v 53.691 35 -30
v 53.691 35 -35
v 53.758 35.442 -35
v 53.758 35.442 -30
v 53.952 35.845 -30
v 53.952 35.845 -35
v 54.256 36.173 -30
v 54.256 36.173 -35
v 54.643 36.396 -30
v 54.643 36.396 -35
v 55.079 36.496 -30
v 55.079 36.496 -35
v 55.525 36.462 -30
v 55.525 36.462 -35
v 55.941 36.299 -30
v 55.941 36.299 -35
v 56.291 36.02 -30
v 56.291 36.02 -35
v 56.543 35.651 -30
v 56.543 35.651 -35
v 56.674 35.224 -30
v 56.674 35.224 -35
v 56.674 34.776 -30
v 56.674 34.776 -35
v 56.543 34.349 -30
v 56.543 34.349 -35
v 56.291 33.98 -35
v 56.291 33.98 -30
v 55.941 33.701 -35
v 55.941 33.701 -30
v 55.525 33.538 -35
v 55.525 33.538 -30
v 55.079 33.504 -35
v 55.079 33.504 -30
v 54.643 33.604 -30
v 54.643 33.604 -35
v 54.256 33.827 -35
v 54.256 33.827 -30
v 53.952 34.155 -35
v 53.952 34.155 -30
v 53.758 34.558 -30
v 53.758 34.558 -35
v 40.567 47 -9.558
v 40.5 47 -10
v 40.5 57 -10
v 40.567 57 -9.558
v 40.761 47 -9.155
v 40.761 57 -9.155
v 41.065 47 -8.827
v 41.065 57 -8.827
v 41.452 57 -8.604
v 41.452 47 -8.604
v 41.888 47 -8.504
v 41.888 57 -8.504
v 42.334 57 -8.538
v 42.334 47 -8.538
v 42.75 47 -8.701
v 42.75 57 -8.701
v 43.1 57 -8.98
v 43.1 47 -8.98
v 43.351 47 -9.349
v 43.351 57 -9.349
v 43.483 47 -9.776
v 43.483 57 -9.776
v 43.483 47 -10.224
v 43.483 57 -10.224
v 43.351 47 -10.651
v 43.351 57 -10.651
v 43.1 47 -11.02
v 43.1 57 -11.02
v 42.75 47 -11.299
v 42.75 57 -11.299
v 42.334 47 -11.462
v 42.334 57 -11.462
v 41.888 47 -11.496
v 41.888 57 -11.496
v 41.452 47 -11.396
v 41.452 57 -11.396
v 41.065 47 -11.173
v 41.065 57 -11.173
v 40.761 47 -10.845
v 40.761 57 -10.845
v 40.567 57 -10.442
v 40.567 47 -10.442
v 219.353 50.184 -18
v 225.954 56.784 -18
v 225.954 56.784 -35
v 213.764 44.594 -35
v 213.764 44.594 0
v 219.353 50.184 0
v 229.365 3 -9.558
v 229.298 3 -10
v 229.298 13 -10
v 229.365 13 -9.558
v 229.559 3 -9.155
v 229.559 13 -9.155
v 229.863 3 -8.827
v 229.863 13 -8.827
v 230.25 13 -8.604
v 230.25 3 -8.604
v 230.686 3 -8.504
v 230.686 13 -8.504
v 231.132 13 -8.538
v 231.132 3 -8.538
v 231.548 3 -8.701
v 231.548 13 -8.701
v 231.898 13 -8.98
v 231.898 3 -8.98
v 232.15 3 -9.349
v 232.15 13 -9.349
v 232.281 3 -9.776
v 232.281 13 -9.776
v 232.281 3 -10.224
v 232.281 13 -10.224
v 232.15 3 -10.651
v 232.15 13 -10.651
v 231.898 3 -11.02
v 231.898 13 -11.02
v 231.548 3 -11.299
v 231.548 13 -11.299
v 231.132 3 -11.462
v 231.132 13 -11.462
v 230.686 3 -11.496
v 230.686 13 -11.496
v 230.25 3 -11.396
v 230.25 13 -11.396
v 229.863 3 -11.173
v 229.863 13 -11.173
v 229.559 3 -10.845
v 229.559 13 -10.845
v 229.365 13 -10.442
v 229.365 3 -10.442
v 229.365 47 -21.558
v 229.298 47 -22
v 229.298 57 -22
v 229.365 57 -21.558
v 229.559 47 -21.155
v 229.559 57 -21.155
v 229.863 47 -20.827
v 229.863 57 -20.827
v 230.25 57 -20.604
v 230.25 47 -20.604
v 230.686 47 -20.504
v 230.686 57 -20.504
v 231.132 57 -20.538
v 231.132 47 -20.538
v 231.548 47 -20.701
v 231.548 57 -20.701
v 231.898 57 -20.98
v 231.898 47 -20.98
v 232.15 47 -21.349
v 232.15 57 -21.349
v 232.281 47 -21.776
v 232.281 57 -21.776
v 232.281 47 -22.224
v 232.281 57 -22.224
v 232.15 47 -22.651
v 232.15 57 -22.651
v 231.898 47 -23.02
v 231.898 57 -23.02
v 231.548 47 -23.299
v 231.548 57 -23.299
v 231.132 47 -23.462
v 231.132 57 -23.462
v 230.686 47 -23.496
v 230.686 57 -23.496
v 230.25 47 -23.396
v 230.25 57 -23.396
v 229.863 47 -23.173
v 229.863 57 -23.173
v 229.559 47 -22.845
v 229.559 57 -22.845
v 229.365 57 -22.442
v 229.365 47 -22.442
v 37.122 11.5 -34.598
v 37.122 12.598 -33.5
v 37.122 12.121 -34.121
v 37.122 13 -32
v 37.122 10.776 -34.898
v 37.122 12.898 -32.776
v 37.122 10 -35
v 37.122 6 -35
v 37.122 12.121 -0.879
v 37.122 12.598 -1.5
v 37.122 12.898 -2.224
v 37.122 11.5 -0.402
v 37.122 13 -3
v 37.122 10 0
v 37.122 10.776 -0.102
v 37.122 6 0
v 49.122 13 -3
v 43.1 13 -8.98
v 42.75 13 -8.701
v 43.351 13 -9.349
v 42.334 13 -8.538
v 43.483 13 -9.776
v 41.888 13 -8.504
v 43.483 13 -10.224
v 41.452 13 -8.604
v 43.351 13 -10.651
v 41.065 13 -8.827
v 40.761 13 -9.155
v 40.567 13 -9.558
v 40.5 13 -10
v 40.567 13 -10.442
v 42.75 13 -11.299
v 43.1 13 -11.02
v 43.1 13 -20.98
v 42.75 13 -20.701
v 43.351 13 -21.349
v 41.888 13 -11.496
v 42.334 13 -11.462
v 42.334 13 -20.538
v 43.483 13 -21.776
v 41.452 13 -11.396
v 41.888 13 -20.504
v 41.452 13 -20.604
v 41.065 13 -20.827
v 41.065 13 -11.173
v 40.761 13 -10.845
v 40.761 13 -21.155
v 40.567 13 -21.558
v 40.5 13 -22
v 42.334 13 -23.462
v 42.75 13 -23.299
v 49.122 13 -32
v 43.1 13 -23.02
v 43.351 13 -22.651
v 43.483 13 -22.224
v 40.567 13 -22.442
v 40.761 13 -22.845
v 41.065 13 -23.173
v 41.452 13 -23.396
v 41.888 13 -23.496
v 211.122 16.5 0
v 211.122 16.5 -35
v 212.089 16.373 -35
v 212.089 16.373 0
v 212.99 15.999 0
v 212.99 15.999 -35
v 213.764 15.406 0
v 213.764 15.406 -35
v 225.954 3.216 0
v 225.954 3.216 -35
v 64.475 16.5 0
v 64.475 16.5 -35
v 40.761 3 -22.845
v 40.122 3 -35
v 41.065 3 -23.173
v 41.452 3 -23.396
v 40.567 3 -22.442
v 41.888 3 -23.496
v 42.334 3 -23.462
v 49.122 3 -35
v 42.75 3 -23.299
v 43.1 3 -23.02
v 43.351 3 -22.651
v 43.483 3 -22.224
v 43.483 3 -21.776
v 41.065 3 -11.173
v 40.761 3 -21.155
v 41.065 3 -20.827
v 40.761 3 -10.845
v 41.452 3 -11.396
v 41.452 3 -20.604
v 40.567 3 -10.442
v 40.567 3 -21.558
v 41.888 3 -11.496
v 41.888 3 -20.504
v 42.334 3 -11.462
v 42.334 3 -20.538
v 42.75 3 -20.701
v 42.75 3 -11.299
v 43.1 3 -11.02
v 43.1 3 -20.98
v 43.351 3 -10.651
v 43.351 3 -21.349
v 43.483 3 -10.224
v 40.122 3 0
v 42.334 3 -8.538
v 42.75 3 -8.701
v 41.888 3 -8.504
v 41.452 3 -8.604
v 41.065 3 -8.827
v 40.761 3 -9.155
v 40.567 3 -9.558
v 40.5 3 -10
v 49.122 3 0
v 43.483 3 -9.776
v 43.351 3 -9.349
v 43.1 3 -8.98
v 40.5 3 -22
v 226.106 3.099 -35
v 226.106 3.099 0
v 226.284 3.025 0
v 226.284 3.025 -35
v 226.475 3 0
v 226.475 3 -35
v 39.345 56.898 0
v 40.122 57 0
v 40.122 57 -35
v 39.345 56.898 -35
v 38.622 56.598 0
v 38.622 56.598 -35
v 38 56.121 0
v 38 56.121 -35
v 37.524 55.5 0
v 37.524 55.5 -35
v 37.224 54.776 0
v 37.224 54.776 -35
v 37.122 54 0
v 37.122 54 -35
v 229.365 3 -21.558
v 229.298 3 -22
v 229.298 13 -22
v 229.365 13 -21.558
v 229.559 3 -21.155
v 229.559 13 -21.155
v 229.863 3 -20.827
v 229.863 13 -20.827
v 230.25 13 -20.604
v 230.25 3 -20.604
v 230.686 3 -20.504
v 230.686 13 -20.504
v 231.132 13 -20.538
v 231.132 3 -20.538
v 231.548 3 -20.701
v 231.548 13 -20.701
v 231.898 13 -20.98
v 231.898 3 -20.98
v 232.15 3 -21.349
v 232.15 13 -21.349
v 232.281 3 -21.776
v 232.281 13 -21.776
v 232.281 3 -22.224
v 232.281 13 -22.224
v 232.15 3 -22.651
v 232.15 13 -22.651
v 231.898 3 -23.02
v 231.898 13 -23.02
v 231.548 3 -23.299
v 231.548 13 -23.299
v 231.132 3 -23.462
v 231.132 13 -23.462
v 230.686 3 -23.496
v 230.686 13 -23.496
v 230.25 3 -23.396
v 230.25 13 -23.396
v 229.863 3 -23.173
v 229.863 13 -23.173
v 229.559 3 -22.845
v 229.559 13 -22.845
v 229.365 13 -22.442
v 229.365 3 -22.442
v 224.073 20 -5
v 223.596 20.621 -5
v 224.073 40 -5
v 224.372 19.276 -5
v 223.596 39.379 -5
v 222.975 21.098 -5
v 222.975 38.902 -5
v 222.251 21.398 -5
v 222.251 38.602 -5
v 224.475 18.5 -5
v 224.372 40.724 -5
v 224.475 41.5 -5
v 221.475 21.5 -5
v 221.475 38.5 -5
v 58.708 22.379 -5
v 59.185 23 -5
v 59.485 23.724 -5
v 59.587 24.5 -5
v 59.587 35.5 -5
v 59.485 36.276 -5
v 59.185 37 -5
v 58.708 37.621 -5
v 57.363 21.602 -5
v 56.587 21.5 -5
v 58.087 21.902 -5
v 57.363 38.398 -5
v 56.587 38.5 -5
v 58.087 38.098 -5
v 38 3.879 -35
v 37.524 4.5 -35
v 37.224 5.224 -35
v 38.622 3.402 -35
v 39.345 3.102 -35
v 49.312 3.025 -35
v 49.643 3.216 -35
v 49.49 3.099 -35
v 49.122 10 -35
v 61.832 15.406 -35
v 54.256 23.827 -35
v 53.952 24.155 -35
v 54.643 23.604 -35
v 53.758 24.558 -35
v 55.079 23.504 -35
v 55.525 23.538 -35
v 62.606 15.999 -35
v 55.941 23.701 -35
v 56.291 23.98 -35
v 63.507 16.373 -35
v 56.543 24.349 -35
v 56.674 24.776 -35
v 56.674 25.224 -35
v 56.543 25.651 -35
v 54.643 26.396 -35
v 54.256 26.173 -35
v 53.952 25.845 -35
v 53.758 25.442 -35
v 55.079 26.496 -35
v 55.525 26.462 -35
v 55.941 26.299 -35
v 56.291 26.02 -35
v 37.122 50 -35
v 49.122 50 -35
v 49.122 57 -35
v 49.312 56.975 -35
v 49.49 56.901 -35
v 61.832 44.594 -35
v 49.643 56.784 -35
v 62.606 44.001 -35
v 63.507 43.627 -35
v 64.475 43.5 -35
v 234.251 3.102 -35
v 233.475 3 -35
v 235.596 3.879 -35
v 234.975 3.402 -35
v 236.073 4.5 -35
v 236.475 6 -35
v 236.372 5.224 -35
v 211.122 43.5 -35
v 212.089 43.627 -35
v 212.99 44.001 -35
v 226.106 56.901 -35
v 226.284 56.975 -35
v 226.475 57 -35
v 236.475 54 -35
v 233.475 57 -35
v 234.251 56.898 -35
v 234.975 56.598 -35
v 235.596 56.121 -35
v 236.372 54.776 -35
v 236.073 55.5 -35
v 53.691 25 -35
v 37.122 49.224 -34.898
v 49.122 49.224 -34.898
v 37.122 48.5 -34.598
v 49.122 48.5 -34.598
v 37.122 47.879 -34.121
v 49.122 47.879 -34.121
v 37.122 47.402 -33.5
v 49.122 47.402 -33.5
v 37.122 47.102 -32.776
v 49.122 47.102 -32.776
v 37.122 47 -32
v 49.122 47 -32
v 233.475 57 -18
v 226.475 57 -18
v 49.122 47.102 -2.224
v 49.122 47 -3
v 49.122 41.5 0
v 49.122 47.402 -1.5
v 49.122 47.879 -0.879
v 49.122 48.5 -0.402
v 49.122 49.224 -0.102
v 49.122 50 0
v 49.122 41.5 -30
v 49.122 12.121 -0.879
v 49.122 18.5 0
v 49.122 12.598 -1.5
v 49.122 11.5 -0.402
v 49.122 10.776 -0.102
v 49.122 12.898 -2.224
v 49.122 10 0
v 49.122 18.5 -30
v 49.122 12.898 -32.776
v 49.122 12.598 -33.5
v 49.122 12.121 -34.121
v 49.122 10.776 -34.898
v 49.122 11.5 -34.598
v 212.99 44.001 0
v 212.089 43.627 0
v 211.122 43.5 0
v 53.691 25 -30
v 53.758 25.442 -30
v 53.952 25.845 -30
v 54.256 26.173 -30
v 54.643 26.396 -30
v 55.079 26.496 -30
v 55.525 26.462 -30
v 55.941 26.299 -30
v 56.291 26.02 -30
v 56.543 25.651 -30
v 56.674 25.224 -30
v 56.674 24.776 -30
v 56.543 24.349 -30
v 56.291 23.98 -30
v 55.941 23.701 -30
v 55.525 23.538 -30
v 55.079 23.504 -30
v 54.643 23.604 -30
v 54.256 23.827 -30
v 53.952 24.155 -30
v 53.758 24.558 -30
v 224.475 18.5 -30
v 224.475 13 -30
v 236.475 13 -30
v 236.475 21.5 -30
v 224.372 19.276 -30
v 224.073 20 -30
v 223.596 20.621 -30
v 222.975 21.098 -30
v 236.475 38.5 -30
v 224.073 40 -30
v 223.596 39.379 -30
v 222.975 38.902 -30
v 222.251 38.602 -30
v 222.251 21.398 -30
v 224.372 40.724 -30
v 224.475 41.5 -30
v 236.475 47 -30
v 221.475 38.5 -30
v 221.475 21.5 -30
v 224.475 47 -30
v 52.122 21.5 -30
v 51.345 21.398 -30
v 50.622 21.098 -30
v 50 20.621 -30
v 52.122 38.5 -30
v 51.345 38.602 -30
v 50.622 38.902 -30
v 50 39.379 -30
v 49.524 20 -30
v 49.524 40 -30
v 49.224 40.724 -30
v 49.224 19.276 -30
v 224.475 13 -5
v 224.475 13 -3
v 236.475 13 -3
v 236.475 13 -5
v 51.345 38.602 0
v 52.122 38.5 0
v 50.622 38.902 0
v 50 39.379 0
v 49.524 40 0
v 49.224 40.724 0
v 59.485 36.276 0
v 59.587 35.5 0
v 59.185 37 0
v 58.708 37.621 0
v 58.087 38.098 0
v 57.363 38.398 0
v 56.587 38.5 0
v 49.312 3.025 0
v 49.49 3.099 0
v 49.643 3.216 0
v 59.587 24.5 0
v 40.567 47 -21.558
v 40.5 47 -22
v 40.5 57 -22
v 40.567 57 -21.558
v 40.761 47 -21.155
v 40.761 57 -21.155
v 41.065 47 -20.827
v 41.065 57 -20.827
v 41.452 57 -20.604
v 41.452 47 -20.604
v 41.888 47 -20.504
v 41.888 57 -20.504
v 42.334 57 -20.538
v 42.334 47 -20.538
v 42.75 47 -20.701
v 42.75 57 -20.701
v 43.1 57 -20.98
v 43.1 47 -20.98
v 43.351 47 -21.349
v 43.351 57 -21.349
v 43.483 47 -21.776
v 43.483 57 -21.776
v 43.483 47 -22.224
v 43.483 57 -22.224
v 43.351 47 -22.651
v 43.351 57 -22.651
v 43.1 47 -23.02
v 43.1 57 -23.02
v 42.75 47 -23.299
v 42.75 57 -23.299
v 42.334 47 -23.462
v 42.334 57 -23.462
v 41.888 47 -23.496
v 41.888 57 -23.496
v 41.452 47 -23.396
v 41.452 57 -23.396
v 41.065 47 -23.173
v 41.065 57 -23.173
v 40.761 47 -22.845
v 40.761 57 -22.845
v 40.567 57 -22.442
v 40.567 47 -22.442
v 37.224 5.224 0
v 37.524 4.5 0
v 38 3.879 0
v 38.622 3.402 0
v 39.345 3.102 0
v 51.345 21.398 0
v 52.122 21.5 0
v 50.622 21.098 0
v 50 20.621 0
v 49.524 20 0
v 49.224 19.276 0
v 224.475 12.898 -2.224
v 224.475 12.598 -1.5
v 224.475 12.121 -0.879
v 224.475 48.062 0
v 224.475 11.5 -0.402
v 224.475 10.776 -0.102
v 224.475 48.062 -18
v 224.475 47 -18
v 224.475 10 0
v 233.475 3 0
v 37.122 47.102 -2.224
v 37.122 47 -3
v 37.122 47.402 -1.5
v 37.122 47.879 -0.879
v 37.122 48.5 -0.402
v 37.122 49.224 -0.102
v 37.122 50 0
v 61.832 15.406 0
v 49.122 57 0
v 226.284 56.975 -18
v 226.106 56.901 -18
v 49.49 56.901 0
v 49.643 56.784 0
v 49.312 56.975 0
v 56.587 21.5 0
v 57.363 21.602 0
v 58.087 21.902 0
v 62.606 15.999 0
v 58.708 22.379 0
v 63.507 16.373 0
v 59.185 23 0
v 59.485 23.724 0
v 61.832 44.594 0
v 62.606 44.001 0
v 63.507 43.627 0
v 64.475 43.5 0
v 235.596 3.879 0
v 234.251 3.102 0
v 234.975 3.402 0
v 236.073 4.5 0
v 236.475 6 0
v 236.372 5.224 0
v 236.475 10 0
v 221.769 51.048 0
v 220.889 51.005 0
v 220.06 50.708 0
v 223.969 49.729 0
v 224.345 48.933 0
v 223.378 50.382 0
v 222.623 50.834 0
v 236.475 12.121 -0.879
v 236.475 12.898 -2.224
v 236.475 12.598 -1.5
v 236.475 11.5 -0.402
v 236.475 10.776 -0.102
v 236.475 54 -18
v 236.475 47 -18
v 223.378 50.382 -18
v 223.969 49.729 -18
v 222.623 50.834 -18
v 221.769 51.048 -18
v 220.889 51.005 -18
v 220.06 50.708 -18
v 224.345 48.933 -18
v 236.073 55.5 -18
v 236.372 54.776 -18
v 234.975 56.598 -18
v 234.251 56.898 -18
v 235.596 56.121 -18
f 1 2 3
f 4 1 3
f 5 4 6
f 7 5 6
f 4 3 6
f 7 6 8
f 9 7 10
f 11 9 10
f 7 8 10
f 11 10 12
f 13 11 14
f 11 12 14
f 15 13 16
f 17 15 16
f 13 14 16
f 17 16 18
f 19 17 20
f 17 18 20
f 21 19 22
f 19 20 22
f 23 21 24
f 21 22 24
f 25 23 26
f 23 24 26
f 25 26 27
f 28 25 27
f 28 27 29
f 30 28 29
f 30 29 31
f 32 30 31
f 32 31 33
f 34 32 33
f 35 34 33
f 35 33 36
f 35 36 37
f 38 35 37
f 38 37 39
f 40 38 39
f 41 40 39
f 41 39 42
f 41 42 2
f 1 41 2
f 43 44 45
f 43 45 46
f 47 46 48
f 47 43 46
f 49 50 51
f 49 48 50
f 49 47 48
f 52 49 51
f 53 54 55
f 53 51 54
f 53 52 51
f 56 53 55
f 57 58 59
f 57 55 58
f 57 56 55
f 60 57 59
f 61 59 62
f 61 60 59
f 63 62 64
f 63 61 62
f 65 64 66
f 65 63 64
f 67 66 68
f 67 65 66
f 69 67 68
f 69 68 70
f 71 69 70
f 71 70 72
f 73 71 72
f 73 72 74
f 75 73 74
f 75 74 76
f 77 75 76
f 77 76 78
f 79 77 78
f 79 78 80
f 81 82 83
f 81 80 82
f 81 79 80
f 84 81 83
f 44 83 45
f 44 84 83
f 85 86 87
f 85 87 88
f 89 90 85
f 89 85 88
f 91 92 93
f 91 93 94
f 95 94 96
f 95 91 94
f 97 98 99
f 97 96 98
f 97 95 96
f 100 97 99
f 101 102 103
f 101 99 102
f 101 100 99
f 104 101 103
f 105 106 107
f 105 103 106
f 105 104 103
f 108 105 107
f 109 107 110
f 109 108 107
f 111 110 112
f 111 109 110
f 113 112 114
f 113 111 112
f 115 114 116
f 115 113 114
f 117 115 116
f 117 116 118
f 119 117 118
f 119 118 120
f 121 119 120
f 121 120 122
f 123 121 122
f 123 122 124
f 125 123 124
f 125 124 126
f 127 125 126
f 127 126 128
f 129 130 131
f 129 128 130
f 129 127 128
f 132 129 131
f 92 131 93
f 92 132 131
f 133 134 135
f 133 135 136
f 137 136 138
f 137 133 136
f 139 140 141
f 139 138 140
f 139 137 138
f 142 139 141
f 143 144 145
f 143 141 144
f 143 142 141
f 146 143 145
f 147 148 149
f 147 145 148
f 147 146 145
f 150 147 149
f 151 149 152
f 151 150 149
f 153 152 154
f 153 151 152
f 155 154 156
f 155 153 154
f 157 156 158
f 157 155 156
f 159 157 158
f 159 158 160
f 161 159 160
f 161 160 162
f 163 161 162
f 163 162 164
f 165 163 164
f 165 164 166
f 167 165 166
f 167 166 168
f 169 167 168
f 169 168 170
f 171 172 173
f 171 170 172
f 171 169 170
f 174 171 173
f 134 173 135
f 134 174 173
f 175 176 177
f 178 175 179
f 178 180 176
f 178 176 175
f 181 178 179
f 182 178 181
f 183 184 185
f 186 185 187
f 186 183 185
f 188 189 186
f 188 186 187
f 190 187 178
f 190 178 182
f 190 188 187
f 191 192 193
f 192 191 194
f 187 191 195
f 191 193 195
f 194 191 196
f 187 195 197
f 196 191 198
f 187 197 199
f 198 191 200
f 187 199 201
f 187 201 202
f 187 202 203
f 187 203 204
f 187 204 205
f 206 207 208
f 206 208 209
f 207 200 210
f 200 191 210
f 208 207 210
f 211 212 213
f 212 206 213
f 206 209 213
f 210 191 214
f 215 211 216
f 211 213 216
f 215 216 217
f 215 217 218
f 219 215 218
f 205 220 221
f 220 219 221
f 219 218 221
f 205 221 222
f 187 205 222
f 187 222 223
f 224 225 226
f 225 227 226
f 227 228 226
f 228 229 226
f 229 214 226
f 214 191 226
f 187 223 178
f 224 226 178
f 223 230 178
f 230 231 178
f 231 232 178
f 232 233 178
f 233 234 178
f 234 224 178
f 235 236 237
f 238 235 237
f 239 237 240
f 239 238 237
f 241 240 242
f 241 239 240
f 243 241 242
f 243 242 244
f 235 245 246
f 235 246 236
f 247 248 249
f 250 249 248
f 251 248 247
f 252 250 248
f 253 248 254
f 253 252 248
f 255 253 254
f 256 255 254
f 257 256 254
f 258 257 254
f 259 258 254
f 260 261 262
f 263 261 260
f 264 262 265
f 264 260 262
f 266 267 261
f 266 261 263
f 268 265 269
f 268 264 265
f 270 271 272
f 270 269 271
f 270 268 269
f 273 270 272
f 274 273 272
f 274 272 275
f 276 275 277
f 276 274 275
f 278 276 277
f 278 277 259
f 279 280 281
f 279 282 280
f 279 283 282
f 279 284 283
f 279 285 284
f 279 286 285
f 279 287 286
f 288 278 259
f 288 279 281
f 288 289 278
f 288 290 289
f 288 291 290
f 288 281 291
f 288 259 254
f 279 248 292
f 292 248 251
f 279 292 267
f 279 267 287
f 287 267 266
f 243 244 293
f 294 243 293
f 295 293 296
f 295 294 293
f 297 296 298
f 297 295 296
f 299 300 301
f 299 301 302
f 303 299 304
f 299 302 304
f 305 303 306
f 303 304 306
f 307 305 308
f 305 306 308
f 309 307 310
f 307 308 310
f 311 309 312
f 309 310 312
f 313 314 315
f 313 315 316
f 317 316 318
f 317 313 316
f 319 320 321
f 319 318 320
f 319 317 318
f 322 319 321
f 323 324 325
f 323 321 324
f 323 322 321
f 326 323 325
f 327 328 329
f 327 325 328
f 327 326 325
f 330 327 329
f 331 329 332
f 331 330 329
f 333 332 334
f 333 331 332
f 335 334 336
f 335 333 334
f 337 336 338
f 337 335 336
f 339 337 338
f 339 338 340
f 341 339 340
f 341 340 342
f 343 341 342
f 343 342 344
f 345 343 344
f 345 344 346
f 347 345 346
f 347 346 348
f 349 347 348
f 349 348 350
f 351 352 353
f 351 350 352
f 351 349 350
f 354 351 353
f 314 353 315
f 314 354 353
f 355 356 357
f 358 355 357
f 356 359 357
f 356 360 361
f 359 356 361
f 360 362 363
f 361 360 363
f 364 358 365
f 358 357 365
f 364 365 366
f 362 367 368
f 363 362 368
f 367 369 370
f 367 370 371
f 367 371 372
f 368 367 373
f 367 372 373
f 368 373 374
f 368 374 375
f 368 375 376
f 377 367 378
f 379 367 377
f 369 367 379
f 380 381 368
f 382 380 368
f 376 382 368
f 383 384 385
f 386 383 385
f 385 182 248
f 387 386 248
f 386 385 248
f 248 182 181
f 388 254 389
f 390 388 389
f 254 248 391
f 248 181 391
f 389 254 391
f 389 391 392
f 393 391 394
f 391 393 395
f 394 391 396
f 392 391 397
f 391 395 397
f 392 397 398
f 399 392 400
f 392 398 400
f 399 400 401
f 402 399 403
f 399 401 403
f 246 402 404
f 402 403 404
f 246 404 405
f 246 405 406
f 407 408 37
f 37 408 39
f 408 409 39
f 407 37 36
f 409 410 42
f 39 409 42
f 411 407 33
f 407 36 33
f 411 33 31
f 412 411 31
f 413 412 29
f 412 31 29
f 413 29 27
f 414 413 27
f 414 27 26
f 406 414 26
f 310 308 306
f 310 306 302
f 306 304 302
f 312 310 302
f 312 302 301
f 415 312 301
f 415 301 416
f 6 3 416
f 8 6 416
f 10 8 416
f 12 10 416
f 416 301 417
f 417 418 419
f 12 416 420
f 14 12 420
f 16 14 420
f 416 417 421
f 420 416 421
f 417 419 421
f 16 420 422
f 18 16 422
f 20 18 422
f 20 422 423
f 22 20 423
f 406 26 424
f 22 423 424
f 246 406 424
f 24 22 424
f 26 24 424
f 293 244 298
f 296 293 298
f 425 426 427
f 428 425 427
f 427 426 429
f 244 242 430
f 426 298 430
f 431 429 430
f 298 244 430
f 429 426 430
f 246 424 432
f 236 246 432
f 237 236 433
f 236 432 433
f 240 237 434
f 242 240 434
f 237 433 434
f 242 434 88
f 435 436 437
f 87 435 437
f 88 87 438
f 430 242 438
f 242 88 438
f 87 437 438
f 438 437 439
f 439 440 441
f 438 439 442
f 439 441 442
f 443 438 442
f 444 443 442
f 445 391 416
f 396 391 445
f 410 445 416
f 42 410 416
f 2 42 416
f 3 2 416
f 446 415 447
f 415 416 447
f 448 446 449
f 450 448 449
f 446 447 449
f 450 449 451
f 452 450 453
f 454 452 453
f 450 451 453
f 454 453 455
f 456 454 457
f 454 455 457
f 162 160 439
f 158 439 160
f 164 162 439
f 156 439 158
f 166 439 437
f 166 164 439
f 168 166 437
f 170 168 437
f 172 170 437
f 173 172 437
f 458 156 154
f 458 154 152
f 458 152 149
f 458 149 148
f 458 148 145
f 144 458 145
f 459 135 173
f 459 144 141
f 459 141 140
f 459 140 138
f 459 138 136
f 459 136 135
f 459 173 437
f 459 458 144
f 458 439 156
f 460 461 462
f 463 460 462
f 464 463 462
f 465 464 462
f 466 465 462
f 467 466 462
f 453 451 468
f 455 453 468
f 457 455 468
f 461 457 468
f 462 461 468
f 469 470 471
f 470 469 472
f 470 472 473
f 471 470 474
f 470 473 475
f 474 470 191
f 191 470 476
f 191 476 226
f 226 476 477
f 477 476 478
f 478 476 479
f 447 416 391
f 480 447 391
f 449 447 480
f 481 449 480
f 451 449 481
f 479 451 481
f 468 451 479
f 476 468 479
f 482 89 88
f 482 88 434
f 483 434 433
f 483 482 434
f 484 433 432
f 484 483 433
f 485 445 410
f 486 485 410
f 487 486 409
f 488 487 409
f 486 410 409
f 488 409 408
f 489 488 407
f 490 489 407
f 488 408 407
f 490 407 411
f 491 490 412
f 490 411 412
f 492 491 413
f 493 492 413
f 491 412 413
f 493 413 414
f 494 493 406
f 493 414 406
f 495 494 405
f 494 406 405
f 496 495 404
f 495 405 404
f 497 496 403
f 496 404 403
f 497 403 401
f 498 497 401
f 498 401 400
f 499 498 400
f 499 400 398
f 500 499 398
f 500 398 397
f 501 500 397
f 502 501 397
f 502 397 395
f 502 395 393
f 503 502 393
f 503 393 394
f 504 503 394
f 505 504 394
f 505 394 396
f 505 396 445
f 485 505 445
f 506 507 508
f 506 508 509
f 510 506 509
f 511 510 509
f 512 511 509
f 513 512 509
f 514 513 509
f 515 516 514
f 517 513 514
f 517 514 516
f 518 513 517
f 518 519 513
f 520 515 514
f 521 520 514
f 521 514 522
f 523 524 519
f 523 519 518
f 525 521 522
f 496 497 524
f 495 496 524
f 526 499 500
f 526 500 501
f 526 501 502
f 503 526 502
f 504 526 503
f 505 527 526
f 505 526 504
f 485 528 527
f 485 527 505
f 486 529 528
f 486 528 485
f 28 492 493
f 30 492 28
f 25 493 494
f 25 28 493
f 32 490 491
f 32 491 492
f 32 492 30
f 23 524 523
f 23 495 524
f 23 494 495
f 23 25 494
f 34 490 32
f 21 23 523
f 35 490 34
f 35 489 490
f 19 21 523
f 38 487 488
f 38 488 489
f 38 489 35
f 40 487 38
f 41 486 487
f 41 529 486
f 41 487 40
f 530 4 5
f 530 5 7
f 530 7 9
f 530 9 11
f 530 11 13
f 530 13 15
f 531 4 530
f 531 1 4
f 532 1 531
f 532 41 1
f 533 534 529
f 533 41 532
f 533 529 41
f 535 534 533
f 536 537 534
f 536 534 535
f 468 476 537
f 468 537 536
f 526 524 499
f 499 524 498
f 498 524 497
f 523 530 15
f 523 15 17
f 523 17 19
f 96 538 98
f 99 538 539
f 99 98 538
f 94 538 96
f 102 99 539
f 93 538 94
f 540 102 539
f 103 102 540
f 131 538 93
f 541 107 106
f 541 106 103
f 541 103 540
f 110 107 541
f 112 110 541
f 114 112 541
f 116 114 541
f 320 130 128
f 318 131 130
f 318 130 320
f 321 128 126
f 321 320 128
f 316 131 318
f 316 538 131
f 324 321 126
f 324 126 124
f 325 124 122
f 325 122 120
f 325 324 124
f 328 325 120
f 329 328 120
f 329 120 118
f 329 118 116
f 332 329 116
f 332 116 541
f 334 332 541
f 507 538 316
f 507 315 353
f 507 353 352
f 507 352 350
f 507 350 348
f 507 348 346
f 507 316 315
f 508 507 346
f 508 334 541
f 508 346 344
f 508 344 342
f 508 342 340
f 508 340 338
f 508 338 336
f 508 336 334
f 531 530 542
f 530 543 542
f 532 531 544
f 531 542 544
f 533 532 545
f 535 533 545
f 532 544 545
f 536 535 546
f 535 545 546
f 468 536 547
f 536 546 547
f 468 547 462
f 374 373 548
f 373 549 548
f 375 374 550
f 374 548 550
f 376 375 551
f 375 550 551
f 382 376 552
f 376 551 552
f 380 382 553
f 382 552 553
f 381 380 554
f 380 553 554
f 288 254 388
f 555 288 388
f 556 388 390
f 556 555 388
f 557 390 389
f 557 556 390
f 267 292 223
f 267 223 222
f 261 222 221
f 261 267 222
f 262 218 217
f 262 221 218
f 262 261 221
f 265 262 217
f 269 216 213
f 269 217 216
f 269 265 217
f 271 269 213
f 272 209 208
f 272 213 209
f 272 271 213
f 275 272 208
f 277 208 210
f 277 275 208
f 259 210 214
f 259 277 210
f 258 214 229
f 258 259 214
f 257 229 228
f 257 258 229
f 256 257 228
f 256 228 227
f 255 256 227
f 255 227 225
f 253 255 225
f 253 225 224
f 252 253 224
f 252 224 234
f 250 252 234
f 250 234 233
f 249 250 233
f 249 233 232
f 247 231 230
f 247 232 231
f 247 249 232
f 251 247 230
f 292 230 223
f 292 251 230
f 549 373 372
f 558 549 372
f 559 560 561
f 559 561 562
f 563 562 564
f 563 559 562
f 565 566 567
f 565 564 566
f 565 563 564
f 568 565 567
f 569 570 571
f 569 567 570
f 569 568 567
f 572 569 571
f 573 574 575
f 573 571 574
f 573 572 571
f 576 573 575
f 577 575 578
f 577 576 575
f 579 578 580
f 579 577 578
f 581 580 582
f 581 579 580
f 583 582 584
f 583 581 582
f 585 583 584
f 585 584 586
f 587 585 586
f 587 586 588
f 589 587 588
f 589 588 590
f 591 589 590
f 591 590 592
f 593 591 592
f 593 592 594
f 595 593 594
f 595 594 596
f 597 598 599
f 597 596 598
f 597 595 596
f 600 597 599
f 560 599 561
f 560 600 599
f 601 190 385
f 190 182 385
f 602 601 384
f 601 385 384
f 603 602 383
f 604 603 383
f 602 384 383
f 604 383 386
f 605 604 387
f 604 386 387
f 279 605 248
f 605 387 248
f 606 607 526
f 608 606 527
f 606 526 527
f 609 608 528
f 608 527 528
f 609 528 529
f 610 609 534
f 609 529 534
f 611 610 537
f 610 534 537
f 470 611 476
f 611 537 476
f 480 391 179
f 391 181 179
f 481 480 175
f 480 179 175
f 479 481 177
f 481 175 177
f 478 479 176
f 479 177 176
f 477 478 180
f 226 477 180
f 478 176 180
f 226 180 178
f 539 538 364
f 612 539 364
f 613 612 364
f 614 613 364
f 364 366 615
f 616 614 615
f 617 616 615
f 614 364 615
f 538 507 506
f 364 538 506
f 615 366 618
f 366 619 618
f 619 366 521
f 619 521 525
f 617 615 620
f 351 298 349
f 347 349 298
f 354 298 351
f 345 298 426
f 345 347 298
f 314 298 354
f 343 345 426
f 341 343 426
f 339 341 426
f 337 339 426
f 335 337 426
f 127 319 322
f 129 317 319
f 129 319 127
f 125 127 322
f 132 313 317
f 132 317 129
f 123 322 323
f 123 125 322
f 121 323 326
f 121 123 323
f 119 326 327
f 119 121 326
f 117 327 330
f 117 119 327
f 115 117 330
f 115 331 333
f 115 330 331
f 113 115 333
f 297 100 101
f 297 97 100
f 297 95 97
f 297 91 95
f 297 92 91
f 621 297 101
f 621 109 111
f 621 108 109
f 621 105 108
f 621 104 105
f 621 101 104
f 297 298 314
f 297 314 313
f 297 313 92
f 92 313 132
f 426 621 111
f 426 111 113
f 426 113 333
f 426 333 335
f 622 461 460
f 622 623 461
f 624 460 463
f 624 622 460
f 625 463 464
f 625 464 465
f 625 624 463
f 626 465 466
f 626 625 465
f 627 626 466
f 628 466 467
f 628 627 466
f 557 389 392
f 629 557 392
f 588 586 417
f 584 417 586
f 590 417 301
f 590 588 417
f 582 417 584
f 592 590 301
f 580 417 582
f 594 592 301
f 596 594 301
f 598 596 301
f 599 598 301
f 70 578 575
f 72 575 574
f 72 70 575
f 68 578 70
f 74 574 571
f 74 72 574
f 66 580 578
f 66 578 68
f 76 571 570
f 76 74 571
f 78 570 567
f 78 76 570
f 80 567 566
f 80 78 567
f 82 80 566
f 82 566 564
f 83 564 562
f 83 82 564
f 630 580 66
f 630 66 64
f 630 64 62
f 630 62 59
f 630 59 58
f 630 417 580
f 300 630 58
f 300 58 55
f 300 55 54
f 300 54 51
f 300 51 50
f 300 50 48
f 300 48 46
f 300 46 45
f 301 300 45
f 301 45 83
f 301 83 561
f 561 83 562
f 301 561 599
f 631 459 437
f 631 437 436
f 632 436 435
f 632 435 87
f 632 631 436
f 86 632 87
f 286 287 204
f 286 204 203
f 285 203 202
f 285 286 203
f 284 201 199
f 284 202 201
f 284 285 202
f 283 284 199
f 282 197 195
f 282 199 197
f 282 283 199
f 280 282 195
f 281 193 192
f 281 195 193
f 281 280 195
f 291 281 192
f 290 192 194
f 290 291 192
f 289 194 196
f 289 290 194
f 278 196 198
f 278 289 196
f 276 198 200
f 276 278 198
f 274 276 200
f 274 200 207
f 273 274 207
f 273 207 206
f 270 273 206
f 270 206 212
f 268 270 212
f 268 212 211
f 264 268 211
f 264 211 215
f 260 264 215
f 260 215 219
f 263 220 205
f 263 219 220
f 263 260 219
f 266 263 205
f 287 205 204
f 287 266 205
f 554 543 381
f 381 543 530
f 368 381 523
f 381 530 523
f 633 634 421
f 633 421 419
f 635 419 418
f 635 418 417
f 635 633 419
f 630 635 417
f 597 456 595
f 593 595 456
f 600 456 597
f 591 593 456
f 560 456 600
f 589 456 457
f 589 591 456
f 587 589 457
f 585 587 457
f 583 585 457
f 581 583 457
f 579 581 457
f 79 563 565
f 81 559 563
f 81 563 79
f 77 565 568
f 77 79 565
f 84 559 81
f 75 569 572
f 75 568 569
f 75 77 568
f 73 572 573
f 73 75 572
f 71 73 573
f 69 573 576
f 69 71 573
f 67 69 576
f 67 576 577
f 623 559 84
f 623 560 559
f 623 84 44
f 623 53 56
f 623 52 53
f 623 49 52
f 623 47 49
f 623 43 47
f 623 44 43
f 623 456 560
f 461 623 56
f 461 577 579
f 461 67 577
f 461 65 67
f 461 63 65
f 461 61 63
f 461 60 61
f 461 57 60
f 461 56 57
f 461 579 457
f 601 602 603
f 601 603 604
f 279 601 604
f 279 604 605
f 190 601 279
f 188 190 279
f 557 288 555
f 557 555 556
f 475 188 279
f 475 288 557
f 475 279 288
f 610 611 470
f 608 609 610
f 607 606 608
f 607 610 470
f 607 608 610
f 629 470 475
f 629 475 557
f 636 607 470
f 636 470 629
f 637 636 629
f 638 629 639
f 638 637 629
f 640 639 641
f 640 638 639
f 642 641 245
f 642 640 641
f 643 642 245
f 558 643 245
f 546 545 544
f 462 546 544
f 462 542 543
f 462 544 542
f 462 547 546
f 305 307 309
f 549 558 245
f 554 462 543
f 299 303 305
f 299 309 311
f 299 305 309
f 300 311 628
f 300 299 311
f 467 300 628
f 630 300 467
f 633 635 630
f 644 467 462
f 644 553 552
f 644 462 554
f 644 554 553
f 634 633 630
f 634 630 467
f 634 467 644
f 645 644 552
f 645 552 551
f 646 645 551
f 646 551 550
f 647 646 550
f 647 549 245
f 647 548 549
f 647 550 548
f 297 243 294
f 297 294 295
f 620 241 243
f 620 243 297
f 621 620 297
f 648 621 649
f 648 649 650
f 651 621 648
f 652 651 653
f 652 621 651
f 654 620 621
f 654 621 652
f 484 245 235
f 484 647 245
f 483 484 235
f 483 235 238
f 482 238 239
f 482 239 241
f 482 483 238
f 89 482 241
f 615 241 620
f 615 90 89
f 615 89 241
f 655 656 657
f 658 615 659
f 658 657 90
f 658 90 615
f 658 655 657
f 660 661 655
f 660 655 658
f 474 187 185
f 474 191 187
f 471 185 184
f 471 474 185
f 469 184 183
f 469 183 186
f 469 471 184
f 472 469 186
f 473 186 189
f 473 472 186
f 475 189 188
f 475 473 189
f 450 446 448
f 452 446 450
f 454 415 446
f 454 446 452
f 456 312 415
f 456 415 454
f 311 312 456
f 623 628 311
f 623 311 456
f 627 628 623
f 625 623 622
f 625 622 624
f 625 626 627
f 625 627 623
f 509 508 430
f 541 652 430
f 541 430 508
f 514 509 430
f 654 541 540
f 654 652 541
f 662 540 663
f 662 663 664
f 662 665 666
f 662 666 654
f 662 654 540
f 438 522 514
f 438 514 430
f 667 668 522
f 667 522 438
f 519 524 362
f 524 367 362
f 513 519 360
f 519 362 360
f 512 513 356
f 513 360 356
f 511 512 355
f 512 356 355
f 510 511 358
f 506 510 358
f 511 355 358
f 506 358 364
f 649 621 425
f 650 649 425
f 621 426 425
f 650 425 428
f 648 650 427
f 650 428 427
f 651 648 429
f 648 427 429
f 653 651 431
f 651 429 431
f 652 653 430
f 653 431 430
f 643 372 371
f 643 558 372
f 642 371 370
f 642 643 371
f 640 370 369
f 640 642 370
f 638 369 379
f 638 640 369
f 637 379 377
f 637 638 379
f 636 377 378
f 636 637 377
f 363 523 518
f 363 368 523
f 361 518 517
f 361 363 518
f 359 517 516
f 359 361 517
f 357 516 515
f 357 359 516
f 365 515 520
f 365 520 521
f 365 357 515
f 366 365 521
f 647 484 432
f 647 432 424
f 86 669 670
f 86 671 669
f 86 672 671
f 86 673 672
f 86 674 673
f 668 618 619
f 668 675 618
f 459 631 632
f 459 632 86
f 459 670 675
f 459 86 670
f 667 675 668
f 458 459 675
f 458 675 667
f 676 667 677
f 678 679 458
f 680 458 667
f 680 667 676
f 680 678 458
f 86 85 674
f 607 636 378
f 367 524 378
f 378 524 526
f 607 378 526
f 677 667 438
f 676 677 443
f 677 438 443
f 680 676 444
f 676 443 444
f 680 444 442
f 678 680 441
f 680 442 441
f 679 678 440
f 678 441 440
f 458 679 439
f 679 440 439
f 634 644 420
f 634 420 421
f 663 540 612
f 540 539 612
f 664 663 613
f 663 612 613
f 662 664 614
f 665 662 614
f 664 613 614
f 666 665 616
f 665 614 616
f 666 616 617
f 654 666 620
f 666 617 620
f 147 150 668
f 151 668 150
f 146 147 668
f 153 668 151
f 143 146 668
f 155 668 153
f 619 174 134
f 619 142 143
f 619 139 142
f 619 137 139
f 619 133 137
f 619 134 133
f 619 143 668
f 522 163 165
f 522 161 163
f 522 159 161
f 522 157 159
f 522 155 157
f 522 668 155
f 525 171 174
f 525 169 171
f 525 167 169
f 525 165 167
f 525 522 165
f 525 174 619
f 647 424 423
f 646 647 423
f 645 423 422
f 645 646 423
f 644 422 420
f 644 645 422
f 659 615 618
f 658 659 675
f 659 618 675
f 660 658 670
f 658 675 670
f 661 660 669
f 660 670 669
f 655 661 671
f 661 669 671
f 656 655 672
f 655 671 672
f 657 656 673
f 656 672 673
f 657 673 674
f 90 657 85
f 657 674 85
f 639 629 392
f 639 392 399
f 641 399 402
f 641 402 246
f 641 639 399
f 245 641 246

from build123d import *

# Parameters (mm, degrees)
EXTRUDE_1_DEPTH          = 35
SKETCH_2_W               = 25
SKETCH_2_H               = 17
CUT_EXTRUDE_1_DEPTH      = 211.274969583
SKETCH_3_W               = 25
SKETCH_3_H               = 8.5
CUT_EXTRUDE_2_DEPTH      = 12
FILLET_1_R               = 3
CUT_EXTRUDE_3_DEPTH      = 246.07389189
CUT_EXTRUDE_3_DEPTH_BACK = 246.07389189
SKETCH_4_R               = 1.5
CUT_EXTRUDE_4_DEPTH      = 10
FILLET_2_R               = 3
SKETCH_7_W               = 12
SKETCH_7_H               = 3
CUT_EXTRUDE_6_DEPTH      = 18
FILLET_3_R               = 3
CUT_EXTRUDE_8_DEPTH      = 10
FILLET_4_R               = 3
SKETCH_9_R               = 1.5
CUT_EXTRUDE_9_DEPTH      = 8
CUT_EXTRUDE_10_DEPTH     = 8
FILLET_5_R               = 3


with BuildPart() as part:
    # 草图1 → 凸台-拉伸1 (new body)
    with BuildSketch(Plane.XY):
        with BuildLine():
            Line((49.121689234, 57), (37.121689234, 57))
            Line((37.121689234, 57), (37.121689234, 3))
            Line((37.121689234, 3), (49.121689234, 3))
            ThreePointArc((49.121689234, 3), (49.40357385, 3.056070336), (49.642544089, 3.215745145))
            Line((49.642544089, 3.215745145), (61.832374142, 15.405575199))
            ThreePointArc((61.832374142, 15.405575199), (63.044614428, 16.215568261), (64.474549341, 16.5))
            Line((64.474549341, 16.5), (211.121689234, 16.5))
            ThreePointArc((211.121689234, 16.5), (212.551624147, 16.215568261), (213.763864432, 15.405575199))
            Line((213.763864432, 15.405575199), (225.953694486, 3.215745145))
            ThreePointArc((225.953694486, 3.215745145), (226.192664725, 3.056070336), (226.474549341, 3))
            Line((226.474549341, 3), (236.474549341, 3))
            Line((236.474549341, 3), (236.474549341, 57))
            Line((236.474549341, 57), (226.474549341, 57))
            ThreePointArc((226.474549341, 57), (226.192664725, 56.943929664), (225.953694486, 56.784254855))
            Line((225.953694486, 56.784254855), (213.763864432, 44.594424801))
            ThreePointArc((213.763864432, 44.594424801), (212.551624147, 43.784431739), (211.121689234, 43.5))
            Line((211.121689234, 43.5), (64.474549341, 43.5))
            ThreePointArc((64.474549341, 43.5), (63.044614428, 43.784431739), (61.832374142, 44.594424801))
            Line((61.832374142, 44.594424801), (49.642544089, 56.784254855))
            ThreePointArc((49.642544089, 56.784254855), (49.40357385, 56.943929664), (49.121689234, 57))
        make_face()
    extrude(amount=-EXTRUDE_1_DEPTH)

    # 草图2 → 切除-拉伸1 (cut, through all)
    with BuildSketch(Plane.ZY.offset(-37.121689234)):
        with Locations((-17.5, 30)):
            Rectangle(SKETCH_2_W, SKETCH_2_H)
    extrude(amount=-CUT_EXTRUDE_1_DEPTH, mode=Mode.SUBTRACT)

    # 草图3 → 切除-拉伸2 (cut)
    with BuildSketch(Plane.ZY.offset(-37.121689234)):
        with Locations((-17.5, 42.75)):
            Rectangle(SKETCH_3_W, SKETCH_3_H)
        with Locations((-17.5, 17.25)):
            Rectangle(SKETCH_3_W, SKETCH_3_H)
    cut_extrude_2 = extrude(amount=-CUT_EXTRUDE_2_DEPTH, mode=Mode.SUBTRACT)

    # 镜向1: 切除-拉伸2 across plane
    add(cut_extrude_2.mirror(Plane.ZY.offset(-136.798119287)), mode=Mode.SUBTRACT)

    # 圆角1
    fillet_1_edges = [part.edges().sort_by_distance(p)[0] for p in [
        (224.474549341, 38.5, -17.5),
        (224.474549341, 21.5, -17.5),
        (37.121689234, 3, -17.5),
        (37.121689234, 57, -17.5),
        (236.474549341, 57, -17.5),
        (236.474549341, 3, -17.5),
        (49.121689234, 38.5, -17.5),
        (49.121689234, 21.5, -17.5),
    ]]
    fillet(fillet_1_edges, radius=FILLET_1_R)

    # 草图4 → 切除-拉伸3 (cut, two sides: drawn at the far end of the back side and taken through both)
    with BuildSketch(Plane(origin=(0, 57, 0), x_dir=(1, 0, 0), z_dir=(0, 1, 0)).offset(-CUT_EXTRUDE_3_DEPTH_BACK)):
        with Locations(Location((42, 22, 0), (0, 0, 180))):
            Circle(SKETCH_4_R)
        with Locations(Location((42, 10, 0), (0, 0, 180))):
            Circle(SKETCH_4_R)
        with Locations(Location((230.798119287, 22, 0), (0, 0, 180))):
            Circle(SKETCH_4_R)
        with Locations(Location((230.798119287, 10, 0), (0, 0, 180))):
            Circle(SKETCH_4_R)
    extrude(amount=CUT_EXTRUDE_3_DEPTH + CUT_EXTRUDE_3_DEPTH_BACK, mode=Mode.SUBTRACT)

    # 草图5 → 切除-拉伸4 (cut)
    with BuildSketch(Plane(origin=(0, 0, -5), x_dir=(-1, 0, 0), z_dir=(0, 0, -1))):
        Polygon((-224.474549341, 41.5), (-224.474549341, 18.5), (-224.474549341, 13), (-236.474549341, 13), (-236.474549341, 47), (-224.474549341, 47), align=None)
        Polygon((-49.121689234, 41.5), (-49.121689234, 18.5), (-49.121689234, 13), (-37.121689234, 13), (-37.121689234, 47), (-49.121689234, 47), align=None)
    extrude(amount=-CUT_EXTRUDE_4_DEPTH, mode=Mode.SUBTRACT)

    # 圆角2
    fillet_2_edges = [part.edges().sort_by_distance(p)[0] for p in [
        (230.474549341, 13, 0),
        (230.474549341, 47, 0),
        (43.121689234, 47, 0),
        (43.121689234, 13, 0),
    ]]
    fillet(fillet_2_edges, radius=FILLET_2_R)

    # 草图7 → 切除-拉伸6 (cut)
    with BuildSketch(Plane.XY):
        with Locations((230.474549341, 48.5)):
            Rectangle(SKETCH_7_W, SKETCH_7_H)
        with BuildLine():
            Line((224.474549341, 50), (236.474549341, 50))
            Line((236.474549341, 50), (236.474549341, 54))
            ThreePointArc((236.474549341, 54), (235.595869685, 56.121320344), (233.474549341, 57))
            Line((233.474549341, 57), (226.474549341, 57))
            ThreePointArc((226.474549341, 57), (226.192664725, 56.943929664), (225.953694486, 56.784254855))
            Line((225.953694486, 56.784254855), (224.474549341, 55.30510971))
            Line((224.474549341, 55.30510971), (224.474549341, 50))
        make_face()
    extrude(amount=-CUT_EXTRUDE_6_DEPTH, mode=Mode.SUBTRACT)

    # 圆角3
    fillet_3_edges = [part.edges().sort_by_distance(p)[0] for p in [
        (224.474549341, 55.30510971, -9),
    ]]
    fillet(fillet_3_edges, radius=FILLET_3_R)

    # 草图8 → 切除-拉伸8 (cut)
    with BuildSketch(Plane.XY.offset(-30)):
        Polygon((49.121689234, 41.5), (49.121689234, 18.5), (49.121689234, 13), (37.121689234, 13), (37.121689234, 47), (49.121689234, 47), align=None)
    extrude(amount=-CUT_EXTRUDE_8_DEPTH, mode=Mode.SUBTRACT)

    # 圆角4
    fillet_4_edges = [part.edges().sort_by_distance(p)[0] for p in [
        (43.121689234, 13, -35),
        (43.121689234, 47, -35),
    ]]
    fillet(fillet_4_edges, radius=FILLET_4_R)

    # 草图9 → 切除-拉伸9 (cut)
    with BuildSketch(Plane(origin=(0, 0, -35), x_dir=(-1, 0, 0), z_dir=(0, 0, -1))):
        with Locations((-55.191240802, 25)):
            Circle(SKETCH_9_R)
        with Locations((-55.191240802, 35)):
            Circle(SKETCH_9_R)
    extrude(amount=-CUT_EXTRUDE_9_DEPTH, mode=Mode.SUBTRACT)

    # 草图10 → 切除-拉伸10 (cut)
    with BuildSketch(Plane(origin=(0, 0, -5), x_dir=(-1, 0, 0), z_dir=(0, 0, -1))):
        with BuildLine():
            Line((-52.121689234, 38.5), (-59.586907824, 38.5))
            Line((-59.586907824, 38.5), (-59.586907824, 21.5))
            Line((-59.586907824, 21.5), (-52.121689234, 21.5))
            ThreePointArc((-52.121689234, 21.5), (-50.00036889, 20.621320344), (-49.121689234, 18.5))
            Line((-49.121689234, 18.5), (-49.121689234, 41.5))
            ThreePointArc((-49.121689234, 41.5), (-50.00036889, 39.378679656), (-52.121689234, 38.5))
        make_face()
    extrude(amount=-CUT_EXTRUDE_10_DEPTH, mode=Mode.SUBTRACT)

    # 圆角5
    fillet_5_edges = [part.edges().sort_by_distance(p)[0] for p in [
        (59.586907824, 38.5, -2.5),
        (59.586907824, 21.5, -2.5),
    ]]
    fillet(fillet_5_edges, radius=FILLET_5_R)


solid = part.part
